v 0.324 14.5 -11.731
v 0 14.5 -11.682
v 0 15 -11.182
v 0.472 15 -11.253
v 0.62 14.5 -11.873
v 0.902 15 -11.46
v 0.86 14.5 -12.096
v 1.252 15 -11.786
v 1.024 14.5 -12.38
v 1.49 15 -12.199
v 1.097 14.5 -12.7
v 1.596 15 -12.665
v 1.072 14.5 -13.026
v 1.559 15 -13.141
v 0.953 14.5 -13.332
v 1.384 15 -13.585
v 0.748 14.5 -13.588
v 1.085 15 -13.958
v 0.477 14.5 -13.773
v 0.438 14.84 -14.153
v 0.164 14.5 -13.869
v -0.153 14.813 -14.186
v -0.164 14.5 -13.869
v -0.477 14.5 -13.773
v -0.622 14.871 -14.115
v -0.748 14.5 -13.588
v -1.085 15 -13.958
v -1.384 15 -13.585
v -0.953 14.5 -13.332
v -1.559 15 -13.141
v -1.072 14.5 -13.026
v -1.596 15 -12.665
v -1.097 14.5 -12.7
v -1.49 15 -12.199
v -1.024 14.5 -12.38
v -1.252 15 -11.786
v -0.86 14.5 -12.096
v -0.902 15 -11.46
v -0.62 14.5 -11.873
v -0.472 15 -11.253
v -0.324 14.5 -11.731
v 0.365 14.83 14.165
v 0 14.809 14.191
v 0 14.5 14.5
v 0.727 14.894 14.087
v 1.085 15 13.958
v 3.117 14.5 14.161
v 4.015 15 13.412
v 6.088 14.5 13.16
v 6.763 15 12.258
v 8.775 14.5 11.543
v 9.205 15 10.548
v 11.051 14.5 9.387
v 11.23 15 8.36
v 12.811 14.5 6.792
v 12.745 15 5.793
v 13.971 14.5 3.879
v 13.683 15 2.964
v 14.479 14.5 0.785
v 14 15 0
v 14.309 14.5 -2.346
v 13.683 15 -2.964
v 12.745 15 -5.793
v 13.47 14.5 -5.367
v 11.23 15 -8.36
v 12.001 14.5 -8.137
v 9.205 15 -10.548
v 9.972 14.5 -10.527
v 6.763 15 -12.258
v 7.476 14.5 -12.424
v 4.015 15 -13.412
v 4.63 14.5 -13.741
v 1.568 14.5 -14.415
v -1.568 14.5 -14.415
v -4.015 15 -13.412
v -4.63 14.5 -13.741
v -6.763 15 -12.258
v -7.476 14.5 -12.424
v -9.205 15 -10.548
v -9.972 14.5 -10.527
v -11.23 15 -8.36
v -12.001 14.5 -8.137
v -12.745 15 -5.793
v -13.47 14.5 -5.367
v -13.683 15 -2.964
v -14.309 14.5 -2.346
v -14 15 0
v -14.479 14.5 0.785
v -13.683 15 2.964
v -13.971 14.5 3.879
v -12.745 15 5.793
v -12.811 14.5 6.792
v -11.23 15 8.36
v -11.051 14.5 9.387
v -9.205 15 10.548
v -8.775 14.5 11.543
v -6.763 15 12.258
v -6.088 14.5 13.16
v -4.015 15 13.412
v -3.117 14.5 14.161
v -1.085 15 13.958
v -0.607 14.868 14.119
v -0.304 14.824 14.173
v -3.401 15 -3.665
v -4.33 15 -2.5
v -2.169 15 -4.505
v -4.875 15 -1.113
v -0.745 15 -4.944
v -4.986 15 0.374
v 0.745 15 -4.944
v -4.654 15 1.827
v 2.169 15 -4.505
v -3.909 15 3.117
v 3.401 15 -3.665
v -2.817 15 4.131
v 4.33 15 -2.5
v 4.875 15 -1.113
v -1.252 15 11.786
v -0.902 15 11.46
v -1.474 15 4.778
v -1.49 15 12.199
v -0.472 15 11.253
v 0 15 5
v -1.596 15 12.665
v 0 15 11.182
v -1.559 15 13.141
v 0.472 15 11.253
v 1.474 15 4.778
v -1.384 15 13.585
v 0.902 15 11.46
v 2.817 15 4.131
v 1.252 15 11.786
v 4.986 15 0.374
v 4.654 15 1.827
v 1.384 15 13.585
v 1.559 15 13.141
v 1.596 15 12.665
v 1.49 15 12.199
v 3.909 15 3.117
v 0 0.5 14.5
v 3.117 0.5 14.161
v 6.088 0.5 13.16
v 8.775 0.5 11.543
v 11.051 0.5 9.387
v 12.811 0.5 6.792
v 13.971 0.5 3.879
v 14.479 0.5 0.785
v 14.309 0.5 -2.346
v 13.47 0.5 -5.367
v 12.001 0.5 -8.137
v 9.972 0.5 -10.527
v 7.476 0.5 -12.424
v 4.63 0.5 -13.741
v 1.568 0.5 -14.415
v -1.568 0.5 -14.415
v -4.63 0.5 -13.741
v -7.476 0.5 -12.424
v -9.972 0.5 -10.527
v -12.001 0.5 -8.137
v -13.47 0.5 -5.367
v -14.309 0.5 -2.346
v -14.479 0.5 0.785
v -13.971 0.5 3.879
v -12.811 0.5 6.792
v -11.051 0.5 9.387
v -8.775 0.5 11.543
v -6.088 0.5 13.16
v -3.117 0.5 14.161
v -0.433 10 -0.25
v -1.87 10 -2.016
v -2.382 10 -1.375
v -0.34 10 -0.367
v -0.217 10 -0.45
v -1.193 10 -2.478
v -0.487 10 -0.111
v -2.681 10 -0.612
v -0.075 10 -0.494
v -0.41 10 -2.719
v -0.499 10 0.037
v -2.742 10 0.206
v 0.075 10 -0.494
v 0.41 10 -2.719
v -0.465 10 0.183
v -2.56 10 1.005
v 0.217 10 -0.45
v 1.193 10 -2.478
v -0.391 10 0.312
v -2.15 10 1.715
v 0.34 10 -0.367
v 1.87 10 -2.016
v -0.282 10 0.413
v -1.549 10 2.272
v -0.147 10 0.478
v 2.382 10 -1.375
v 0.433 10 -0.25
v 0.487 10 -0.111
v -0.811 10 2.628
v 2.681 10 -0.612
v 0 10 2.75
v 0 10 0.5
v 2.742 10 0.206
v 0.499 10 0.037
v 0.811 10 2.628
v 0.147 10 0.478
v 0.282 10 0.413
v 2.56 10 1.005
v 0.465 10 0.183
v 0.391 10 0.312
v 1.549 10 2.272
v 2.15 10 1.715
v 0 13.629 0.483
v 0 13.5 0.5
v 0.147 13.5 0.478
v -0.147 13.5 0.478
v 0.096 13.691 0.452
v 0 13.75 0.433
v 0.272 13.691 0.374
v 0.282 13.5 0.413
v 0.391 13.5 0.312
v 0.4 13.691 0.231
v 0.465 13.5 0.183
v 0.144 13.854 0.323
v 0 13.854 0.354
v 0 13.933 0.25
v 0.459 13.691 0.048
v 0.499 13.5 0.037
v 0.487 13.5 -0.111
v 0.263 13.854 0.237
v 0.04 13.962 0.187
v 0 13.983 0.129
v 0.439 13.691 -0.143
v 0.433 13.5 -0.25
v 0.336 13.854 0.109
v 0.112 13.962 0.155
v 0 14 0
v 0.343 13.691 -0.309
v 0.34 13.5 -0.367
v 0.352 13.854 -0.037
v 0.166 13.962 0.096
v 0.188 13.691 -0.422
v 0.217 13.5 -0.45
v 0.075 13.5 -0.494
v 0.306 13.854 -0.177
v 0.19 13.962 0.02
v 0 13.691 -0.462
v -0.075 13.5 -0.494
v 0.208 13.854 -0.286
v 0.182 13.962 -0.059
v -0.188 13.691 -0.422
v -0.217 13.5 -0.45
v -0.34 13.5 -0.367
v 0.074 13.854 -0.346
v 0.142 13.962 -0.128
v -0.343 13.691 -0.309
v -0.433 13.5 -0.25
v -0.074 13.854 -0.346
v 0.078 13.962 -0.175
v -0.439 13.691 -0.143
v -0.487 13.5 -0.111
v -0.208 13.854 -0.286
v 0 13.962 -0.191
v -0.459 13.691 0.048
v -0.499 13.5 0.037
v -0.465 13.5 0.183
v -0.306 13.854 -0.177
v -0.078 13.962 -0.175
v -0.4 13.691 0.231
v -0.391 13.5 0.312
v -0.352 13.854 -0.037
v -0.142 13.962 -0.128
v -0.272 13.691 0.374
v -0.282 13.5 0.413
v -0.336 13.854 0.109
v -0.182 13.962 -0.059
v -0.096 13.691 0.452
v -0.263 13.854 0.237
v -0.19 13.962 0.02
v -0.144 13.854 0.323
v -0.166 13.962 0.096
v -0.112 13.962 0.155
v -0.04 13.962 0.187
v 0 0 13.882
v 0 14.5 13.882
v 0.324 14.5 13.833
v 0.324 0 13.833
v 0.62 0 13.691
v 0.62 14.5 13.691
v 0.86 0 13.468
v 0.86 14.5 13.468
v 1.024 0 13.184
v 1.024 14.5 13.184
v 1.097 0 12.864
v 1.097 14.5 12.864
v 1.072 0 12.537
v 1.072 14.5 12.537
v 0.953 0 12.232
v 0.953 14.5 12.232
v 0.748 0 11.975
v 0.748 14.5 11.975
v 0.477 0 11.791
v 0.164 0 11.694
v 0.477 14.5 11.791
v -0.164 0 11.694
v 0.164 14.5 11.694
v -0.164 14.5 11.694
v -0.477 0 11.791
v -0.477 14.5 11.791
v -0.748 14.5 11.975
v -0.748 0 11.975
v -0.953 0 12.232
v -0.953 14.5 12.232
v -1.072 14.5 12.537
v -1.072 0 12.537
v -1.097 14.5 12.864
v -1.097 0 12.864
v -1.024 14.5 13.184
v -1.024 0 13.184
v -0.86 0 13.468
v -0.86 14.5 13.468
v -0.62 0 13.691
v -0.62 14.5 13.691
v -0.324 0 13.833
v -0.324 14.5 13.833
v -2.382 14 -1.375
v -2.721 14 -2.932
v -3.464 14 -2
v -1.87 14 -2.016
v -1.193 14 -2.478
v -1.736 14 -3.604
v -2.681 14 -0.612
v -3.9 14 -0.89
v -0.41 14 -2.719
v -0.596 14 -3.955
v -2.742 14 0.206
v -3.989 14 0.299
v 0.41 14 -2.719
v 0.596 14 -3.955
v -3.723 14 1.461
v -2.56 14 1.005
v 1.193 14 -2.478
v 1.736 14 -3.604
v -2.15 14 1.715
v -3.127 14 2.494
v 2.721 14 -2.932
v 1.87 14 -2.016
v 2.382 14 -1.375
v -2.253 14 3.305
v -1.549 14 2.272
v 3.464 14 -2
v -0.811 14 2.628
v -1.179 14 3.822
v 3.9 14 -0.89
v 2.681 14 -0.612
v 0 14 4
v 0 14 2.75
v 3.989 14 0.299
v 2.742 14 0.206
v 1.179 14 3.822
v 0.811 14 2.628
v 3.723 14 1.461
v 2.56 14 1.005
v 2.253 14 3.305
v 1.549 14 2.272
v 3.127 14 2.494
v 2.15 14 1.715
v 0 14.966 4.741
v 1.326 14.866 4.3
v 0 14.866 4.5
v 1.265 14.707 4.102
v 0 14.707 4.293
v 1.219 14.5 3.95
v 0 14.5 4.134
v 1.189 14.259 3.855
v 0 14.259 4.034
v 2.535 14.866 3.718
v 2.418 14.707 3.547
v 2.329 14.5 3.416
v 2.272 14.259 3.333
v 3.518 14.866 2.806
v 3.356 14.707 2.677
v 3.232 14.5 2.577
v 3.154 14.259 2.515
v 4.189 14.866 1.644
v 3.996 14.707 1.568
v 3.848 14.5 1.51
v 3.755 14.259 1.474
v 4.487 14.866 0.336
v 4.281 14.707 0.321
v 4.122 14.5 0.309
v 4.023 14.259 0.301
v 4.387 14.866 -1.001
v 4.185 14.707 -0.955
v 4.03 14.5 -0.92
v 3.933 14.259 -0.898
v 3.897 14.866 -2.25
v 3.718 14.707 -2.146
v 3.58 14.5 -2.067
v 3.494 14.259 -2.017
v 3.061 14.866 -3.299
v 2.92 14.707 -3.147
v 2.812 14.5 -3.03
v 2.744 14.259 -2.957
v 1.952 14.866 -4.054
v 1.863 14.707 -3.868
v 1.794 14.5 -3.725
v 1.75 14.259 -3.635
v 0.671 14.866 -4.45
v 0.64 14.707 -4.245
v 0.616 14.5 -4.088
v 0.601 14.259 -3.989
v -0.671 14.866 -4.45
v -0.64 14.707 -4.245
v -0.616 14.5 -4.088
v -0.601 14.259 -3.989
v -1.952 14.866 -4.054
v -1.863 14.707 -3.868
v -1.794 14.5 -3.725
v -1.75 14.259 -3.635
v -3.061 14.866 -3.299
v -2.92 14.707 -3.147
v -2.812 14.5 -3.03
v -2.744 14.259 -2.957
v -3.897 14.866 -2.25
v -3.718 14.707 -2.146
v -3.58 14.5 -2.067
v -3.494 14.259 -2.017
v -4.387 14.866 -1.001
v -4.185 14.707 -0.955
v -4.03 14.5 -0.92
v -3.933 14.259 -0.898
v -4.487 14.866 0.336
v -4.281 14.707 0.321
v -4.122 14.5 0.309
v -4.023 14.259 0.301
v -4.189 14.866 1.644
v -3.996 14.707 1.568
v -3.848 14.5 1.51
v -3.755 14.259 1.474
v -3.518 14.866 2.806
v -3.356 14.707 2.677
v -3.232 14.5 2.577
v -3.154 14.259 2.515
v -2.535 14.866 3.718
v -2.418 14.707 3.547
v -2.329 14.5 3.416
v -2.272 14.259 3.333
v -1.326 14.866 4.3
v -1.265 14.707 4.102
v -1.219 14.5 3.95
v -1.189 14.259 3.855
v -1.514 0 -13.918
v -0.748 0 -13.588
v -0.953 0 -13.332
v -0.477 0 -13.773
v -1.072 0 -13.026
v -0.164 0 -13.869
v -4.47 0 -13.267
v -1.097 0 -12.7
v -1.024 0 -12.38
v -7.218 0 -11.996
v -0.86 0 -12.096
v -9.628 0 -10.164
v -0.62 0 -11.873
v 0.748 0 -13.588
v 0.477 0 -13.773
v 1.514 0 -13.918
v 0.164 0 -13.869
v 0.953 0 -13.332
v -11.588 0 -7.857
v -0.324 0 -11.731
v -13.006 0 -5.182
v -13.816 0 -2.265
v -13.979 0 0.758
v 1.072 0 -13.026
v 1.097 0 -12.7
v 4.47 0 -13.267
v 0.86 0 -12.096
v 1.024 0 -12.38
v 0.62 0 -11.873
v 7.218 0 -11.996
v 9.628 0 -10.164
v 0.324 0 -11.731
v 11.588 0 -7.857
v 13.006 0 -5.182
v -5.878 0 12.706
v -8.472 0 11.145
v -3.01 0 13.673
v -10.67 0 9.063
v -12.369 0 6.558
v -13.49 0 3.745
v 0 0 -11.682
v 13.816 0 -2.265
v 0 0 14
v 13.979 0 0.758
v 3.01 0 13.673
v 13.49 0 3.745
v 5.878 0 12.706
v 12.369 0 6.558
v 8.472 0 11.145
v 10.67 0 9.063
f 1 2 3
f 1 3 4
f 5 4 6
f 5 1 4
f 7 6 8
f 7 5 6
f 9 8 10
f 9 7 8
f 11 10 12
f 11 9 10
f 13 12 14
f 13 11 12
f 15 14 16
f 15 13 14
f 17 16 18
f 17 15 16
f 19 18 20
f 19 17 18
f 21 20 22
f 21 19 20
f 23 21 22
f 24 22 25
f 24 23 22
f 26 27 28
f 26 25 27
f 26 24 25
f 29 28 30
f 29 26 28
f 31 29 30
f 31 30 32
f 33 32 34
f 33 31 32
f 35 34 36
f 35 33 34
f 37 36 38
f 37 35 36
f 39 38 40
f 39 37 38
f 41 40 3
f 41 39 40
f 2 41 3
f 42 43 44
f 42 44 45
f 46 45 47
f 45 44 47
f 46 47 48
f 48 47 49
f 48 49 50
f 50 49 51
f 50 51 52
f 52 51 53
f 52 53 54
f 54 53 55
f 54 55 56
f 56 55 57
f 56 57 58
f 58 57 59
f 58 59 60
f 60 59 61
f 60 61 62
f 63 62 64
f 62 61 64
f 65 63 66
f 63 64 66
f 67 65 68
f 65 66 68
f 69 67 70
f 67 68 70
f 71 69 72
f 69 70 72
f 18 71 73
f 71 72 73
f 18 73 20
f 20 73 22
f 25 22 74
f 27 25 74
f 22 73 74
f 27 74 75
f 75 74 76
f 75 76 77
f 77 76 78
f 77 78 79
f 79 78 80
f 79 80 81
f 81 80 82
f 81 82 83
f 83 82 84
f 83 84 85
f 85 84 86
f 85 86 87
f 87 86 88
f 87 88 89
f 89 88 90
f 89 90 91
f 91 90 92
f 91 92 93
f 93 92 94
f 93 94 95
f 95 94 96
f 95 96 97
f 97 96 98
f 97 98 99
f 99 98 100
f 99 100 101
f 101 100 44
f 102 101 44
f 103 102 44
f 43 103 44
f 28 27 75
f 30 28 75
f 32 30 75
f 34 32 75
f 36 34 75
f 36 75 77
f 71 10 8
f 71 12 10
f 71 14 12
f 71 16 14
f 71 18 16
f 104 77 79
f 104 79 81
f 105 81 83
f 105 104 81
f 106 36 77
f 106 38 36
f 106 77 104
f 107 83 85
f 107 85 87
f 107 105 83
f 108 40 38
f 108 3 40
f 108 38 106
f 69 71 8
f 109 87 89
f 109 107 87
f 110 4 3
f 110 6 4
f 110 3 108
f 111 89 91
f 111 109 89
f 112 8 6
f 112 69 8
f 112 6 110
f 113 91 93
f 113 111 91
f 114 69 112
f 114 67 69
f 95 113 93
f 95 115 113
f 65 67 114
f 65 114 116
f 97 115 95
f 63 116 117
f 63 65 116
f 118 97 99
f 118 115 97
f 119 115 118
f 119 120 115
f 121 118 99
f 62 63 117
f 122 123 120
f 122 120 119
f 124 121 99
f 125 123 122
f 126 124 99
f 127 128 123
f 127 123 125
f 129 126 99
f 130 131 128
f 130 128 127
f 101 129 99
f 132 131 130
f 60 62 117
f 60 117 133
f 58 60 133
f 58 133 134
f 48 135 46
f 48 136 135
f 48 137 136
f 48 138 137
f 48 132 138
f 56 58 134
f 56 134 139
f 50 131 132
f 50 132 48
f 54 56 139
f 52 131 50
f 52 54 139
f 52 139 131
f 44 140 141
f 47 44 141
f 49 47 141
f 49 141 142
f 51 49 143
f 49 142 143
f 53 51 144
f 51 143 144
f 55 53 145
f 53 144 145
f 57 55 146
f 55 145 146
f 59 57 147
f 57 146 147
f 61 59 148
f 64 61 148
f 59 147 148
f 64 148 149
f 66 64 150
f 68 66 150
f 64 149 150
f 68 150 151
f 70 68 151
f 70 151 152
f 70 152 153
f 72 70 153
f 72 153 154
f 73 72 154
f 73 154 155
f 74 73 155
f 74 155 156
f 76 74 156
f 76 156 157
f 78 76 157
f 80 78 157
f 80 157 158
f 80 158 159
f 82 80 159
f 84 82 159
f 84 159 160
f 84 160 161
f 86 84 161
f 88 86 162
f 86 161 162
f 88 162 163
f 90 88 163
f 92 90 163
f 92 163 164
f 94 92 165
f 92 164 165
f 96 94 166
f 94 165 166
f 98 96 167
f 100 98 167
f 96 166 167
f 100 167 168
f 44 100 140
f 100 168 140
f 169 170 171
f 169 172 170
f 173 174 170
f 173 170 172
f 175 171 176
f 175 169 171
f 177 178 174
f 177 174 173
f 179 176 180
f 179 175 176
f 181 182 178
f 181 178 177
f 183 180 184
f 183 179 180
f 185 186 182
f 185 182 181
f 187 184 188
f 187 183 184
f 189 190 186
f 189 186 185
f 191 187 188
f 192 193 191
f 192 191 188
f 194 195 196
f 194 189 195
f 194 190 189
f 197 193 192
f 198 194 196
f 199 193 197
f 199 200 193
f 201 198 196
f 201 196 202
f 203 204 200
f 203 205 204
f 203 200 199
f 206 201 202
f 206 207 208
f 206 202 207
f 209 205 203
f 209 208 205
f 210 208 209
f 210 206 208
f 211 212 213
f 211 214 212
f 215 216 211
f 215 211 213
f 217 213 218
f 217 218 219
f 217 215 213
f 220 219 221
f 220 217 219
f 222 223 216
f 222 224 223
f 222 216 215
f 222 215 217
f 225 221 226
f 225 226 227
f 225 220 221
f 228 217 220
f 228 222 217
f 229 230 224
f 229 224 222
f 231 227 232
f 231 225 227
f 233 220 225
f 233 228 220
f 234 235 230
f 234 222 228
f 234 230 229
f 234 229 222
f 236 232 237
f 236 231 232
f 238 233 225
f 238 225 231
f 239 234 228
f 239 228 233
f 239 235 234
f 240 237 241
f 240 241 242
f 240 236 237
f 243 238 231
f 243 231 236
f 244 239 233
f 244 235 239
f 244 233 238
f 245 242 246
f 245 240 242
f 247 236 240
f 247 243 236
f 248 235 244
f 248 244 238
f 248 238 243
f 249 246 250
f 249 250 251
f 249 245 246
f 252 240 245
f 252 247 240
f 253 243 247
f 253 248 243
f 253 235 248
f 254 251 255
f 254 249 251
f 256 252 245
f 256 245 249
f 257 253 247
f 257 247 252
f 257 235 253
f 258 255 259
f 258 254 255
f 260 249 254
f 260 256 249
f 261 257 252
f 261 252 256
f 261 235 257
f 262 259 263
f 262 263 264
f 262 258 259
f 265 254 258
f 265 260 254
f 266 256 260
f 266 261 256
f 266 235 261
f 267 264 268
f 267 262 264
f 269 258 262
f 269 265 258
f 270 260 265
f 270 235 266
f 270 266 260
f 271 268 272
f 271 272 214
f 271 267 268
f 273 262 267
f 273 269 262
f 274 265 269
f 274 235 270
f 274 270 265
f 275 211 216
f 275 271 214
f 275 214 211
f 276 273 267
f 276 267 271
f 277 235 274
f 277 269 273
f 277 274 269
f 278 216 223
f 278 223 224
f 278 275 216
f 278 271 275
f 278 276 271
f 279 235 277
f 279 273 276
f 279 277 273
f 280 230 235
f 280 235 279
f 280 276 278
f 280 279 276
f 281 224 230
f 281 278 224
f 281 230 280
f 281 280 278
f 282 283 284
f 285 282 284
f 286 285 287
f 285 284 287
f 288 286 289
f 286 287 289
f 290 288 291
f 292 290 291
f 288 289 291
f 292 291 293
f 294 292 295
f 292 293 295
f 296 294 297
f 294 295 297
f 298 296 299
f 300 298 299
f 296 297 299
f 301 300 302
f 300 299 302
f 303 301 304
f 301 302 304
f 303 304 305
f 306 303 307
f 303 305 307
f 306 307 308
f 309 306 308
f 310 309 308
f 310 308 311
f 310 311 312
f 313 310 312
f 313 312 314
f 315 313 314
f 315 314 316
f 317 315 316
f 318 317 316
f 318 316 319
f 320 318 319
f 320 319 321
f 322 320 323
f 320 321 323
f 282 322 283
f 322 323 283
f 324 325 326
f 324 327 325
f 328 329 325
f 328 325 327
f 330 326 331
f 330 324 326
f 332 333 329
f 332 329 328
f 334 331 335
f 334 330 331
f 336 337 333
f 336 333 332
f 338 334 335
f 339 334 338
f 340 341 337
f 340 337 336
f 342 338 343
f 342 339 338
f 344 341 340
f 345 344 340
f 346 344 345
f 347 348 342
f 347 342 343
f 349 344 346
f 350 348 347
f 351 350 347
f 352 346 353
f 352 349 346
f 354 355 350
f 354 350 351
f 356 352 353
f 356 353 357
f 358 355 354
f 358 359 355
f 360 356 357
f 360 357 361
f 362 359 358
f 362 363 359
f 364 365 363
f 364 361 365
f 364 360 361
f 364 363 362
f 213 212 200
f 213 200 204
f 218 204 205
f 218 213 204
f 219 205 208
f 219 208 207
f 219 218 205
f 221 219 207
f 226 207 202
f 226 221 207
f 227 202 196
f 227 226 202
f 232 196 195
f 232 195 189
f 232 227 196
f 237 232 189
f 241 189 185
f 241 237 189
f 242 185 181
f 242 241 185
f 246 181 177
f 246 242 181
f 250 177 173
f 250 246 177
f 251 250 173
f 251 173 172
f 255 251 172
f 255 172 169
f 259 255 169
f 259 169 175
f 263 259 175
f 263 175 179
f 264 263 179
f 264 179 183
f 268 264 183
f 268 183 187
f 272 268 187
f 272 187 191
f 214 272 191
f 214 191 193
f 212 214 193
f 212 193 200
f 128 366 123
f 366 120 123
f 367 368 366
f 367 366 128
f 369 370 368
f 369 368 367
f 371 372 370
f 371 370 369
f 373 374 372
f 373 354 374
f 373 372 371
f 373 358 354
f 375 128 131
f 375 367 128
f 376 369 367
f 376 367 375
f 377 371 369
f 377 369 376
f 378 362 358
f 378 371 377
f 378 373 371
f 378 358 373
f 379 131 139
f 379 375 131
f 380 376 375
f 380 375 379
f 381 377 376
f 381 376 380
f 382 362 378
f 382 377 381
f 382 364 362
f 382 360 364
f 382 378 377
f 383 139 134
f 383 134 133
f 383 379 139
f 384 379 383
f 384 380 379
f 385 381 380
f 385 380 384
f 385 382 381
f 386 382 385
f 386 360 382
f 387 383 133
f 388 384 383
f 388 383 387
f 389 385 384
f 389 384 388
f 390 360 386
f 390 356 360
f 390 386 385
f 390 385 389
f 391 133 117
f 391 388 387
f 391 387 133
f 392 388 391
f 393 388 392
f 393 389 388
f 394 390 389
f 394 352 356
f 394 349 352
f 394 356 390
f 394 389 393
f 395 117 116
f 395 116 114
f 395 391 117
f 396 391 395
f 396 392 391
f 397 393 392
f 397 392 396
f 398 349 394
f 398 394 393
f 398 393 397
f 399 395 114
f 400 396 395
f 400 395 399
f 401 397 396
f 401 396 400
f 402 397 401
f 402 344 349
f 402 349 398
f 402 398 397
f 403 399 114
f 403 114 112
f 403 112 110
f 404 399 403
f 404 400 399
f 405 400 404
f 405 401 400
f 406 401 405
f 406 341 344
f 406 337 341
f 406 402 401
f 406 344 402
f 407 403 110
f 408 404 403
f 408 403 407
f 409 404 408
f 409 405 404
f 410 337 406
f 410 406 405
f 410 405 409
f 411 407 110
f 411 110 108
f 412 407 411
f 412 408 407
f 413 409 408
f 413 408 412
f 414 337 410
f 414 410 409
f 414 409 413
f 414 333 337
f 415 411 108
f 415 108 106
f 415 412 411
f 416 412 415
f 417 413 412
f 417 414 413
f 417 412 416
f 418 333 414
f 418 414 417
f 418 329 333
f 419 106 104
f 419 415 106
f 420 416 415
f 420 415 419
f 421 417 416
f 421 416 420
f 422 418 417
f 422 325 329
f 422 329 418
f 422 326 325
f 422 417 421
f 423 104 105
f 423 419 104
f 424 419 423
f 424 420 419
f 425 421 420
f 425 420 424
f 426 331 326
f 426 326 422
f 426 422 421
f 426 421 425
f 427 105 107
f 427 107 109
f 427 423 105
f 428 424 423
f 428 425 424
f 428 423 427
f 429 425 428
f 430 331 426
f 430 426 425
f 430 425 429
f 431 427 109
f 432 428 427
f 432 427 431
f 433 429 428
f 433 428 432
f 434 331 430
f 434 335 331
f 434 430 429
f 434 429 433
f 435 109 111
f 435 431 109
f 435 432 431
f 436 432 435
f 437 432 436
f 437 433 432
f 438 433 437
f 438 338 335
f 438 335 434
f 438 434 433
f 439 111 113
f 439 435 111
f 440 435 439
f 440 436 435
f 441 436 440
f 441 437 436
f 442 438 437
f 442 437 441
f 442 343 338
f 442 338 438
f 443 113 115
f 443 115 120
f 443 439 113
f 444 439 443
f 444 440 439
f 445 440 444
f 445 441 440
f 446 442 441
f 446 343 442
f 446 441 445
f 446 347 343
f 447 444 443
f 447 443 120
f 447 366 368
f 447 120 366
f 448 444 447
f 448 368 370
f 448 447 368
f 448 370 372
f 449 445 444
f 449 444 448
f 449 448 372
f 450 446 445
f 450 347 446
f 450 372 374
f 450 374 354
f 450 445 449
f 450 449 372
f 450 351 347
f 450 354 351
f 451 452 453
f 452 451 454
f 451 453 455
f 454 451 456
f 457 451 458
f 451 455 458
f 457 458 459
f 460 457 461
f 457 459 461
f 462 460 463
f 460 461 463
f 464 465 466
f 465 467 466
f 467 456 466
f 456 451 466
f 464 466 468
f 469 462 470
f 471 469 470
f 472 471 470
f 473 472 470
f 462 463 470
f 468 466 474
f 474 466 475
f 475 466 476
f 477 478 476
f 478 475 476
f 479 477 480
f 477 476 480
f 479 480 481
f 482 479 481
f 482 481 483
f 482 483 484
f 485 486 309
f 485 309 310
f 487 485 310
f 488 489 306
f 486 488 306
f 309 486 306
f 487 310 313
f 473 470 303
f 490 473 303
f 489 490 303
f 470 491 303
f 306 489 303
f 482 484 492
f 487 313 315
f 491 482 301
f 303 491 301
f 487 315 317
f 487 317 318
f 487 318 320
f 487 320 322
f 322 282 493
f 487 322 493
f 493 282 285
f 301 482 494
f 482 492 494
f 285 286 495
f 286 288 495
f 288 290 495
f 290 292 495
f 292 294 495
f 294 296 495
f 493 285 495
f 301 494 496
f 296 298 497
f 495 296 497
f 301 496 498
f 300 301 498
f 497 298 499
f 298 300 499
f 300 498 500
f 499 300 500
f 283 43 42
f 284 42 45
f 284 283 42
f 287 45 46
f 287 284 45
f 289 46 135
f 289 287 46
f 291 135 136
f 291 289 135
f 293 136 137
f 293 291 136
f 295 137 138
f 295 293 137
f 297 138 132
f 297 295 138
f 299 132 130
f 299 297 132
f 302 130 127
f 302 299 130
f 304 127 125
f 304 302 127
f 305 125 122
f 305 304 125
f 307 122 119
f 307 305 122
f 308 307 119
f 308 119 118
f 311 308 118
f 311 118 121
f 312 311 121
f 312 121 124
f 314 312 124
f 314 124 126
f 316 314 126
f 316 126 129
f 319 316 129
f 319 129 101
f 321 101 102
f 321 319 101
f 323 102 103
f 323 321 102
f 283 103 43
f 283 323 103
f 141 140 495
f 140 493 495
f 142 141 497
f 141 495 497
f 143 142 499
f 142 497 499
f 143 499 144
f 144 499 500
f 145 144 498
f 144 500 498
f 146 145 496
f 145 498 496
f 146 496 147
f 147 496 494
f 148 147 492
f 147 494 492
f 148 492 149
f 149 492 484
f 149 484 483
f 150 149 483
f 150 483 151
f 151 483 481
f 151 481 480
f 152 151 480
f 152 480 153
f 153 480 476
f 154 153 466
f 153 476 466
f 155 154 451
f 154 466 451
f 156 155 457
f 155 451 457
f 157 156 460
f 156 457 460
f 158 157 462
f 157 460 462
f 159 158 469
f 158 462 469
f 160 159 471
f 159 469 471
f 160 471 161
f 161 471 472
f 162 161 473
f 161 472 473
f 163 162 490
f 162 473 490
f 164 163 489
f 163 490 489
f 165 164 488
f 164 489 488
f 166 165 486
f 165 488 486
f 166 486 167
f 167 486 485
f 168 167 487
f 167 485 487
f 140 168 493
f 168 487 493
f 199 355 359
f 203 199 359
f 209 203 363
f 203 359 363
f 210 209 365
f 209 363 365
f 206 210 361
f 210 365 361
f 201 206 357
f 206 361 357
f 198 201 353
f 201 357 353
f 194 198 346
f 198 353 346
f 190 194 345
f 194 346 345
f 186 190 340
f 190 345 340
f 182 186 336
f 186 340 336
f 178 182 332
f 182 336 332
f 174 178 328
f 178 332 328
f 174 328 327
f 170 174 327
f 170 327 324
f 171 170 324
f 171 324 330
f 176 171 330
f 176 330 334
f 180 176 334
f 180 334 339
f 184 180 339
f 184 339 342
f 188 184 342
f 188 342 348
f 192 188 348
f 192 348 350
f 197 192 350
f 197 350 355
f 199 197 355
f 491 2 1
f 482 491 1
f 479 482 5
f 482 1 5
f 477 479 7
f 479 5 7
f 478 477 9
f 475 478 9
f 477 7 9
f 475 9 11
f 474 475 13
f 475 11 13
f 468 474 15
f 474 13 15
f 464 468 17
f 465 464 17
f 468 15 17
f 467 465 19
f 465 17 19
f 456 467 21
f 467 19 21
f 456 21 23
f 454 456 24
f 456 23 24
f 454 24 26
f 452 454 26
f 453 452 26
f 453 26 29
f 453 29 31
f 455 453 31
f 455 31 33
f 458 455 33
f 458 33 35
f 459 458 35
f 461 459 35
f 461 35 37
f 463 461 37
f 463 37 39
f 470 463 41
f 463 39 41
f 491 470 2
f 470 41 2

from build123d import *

# Parameters (mm, degrees)
SKETCH1_R           = 14.5
BOSS_EXTRUDE1_DEPTH = 15
SKETCH2_R           = 1.1
CUT_EXTRUDE1_DEPTH  = 15
CHAMFER1_SIZE       = 0.5
CHAMFER2_SIZE       = 0.5
SKETCH3_R           = 2.75
SKETCH3_R_2         = 0.5
CUT_EXTRUDE2_DEPTH  = 5
SKETCH4_R           = 4
CUT_EXTRUDE3_DEPTH  = 1
FILLET1_R           = 1
FILLET2_R           = 0.5


# Some blends are built 0.0001 mm under size
with BuildPart() as part:
    # Sketch1 → Boss-Extrude1 (new body)
    with BuildSketch(Plane(origin=(0, 0, 0), x_dir=(1, 0, 0), z_dir=(0, 1, 0))):
        with Locations(Location((0, 0, 0), (0, 0, 270))):
            Circle(SKETCH1_R)
    extrude(amount=BOSS_EXTRUDE1_DEPTH)

    # Sketch2 → Cut-Extrude1 (cut)
    with BuildSketch(Plane(origin=(0, 15, 0), x_dir=(1, 0, 0), z_dir=(0, 1, 0))):
        with Locations(Location((0, 12.781725236, 0), (0, 0, 270))):
            Circle(SKETCH2_R)
        with Locations(Location((0, -12.781725236, 0), (0, 0, 270))):
            Circle(SKETCH2_R)
    extrude(amount=-CUT_EXTRUDE1_DEPTH, mode=Mode.SUBTRACT)

    # Chamfer1
    chamfer1_edges = [part.edges().sort_by_distance(p)[0] for p in [
        (0, 15, -13.881725236),
        (0, 15, 11.681725236),
    ]]
    chamfer(chamfer1_edges, length=CHAMFER1_SIZE)

    # Chamfer2
    # the kernel refuses this chamfer: 0.5 mm, written as the material it takes off along each edge
    with BuildSketch(Plane(origin=(0, 0, 0), x_dir=(0, 0, 1), z_dir=(-1, 0, 0))) as chamfer2_piece_1:
        Polygon((14.5, CHAMFER2_SIZE), (14.5 - CHAMFER2_SIZE, 0), (14.5, 0), align=None)
    revolve(axis=Axis((0, 0, 0), (0, 1, 0)), mode=Mode.SUBTRACT)
    with BuildSketch(Plane(origin=(0, 15, 0), x_dir=(0, 0, 1), z_dir=(-1, 0, 0))) as chamfer2_piece_2:
        Polygon((14.5 - CHAMFER2_SIZE, 0), (14.5, -CHAMFER2_SIZE), (14.5, 0), align=None)
    revolve(axis=Axis((0, 15, 0), (0, 1, 0)), mode=Mode.SUBTRACT)

    # Sketch3 → Cut-Extrude2 (cut)
    with BuildSketch(Plane(origin=(0, 15, 0), x_dir=(1, 0, 0), z_dir=(0, 1, 0))):
        with Locations(Location((0, 0, 0), (0, 0, 270))):
            Circle(SKETCH3_R)
        with Locations(Location((0, 0, 0), (0, 0, 270))):
            Circle(SKETCH3_R_2, mode=Mode.SUBTRACT)
    extrude(amount=-CUT_EXTRUDE2_DEPTH, mode=Mode.SUBTRACT)

    # Sketch4 → Cut-Extrude3 (cut)
    with BuildSketch(Plane(origin=(0, 15, 0), x_dir=(1, 0, 0), z_dir=(0, 1, 0))):
        with Locations(Location((0, 0, 0), (0, 0, 270))):
            Circle(SKETCH4_R)
    extrude(amount=-CUT_EXTRUDE3_DEPTH, mode=Mode.SUBTRACT)

    # Fillet1
    fillet1_edges = [part.edges().sort_by_distance(p)[0] for p in [
        (0, 15, -4),
    ]]
    fillet(fillet1_edges, radius=FILLET1_R - 0.0001)  # a hair under: the kernel refuses the full size

    # Fillet2
    fillet2_edges = [part.edges().sort_by_distance(p)[0] for p in [
        (0, 14, -0.5),
    ]]
    fillet(fillet2_edges, radius=FILLET2_R)


solid = part.part
